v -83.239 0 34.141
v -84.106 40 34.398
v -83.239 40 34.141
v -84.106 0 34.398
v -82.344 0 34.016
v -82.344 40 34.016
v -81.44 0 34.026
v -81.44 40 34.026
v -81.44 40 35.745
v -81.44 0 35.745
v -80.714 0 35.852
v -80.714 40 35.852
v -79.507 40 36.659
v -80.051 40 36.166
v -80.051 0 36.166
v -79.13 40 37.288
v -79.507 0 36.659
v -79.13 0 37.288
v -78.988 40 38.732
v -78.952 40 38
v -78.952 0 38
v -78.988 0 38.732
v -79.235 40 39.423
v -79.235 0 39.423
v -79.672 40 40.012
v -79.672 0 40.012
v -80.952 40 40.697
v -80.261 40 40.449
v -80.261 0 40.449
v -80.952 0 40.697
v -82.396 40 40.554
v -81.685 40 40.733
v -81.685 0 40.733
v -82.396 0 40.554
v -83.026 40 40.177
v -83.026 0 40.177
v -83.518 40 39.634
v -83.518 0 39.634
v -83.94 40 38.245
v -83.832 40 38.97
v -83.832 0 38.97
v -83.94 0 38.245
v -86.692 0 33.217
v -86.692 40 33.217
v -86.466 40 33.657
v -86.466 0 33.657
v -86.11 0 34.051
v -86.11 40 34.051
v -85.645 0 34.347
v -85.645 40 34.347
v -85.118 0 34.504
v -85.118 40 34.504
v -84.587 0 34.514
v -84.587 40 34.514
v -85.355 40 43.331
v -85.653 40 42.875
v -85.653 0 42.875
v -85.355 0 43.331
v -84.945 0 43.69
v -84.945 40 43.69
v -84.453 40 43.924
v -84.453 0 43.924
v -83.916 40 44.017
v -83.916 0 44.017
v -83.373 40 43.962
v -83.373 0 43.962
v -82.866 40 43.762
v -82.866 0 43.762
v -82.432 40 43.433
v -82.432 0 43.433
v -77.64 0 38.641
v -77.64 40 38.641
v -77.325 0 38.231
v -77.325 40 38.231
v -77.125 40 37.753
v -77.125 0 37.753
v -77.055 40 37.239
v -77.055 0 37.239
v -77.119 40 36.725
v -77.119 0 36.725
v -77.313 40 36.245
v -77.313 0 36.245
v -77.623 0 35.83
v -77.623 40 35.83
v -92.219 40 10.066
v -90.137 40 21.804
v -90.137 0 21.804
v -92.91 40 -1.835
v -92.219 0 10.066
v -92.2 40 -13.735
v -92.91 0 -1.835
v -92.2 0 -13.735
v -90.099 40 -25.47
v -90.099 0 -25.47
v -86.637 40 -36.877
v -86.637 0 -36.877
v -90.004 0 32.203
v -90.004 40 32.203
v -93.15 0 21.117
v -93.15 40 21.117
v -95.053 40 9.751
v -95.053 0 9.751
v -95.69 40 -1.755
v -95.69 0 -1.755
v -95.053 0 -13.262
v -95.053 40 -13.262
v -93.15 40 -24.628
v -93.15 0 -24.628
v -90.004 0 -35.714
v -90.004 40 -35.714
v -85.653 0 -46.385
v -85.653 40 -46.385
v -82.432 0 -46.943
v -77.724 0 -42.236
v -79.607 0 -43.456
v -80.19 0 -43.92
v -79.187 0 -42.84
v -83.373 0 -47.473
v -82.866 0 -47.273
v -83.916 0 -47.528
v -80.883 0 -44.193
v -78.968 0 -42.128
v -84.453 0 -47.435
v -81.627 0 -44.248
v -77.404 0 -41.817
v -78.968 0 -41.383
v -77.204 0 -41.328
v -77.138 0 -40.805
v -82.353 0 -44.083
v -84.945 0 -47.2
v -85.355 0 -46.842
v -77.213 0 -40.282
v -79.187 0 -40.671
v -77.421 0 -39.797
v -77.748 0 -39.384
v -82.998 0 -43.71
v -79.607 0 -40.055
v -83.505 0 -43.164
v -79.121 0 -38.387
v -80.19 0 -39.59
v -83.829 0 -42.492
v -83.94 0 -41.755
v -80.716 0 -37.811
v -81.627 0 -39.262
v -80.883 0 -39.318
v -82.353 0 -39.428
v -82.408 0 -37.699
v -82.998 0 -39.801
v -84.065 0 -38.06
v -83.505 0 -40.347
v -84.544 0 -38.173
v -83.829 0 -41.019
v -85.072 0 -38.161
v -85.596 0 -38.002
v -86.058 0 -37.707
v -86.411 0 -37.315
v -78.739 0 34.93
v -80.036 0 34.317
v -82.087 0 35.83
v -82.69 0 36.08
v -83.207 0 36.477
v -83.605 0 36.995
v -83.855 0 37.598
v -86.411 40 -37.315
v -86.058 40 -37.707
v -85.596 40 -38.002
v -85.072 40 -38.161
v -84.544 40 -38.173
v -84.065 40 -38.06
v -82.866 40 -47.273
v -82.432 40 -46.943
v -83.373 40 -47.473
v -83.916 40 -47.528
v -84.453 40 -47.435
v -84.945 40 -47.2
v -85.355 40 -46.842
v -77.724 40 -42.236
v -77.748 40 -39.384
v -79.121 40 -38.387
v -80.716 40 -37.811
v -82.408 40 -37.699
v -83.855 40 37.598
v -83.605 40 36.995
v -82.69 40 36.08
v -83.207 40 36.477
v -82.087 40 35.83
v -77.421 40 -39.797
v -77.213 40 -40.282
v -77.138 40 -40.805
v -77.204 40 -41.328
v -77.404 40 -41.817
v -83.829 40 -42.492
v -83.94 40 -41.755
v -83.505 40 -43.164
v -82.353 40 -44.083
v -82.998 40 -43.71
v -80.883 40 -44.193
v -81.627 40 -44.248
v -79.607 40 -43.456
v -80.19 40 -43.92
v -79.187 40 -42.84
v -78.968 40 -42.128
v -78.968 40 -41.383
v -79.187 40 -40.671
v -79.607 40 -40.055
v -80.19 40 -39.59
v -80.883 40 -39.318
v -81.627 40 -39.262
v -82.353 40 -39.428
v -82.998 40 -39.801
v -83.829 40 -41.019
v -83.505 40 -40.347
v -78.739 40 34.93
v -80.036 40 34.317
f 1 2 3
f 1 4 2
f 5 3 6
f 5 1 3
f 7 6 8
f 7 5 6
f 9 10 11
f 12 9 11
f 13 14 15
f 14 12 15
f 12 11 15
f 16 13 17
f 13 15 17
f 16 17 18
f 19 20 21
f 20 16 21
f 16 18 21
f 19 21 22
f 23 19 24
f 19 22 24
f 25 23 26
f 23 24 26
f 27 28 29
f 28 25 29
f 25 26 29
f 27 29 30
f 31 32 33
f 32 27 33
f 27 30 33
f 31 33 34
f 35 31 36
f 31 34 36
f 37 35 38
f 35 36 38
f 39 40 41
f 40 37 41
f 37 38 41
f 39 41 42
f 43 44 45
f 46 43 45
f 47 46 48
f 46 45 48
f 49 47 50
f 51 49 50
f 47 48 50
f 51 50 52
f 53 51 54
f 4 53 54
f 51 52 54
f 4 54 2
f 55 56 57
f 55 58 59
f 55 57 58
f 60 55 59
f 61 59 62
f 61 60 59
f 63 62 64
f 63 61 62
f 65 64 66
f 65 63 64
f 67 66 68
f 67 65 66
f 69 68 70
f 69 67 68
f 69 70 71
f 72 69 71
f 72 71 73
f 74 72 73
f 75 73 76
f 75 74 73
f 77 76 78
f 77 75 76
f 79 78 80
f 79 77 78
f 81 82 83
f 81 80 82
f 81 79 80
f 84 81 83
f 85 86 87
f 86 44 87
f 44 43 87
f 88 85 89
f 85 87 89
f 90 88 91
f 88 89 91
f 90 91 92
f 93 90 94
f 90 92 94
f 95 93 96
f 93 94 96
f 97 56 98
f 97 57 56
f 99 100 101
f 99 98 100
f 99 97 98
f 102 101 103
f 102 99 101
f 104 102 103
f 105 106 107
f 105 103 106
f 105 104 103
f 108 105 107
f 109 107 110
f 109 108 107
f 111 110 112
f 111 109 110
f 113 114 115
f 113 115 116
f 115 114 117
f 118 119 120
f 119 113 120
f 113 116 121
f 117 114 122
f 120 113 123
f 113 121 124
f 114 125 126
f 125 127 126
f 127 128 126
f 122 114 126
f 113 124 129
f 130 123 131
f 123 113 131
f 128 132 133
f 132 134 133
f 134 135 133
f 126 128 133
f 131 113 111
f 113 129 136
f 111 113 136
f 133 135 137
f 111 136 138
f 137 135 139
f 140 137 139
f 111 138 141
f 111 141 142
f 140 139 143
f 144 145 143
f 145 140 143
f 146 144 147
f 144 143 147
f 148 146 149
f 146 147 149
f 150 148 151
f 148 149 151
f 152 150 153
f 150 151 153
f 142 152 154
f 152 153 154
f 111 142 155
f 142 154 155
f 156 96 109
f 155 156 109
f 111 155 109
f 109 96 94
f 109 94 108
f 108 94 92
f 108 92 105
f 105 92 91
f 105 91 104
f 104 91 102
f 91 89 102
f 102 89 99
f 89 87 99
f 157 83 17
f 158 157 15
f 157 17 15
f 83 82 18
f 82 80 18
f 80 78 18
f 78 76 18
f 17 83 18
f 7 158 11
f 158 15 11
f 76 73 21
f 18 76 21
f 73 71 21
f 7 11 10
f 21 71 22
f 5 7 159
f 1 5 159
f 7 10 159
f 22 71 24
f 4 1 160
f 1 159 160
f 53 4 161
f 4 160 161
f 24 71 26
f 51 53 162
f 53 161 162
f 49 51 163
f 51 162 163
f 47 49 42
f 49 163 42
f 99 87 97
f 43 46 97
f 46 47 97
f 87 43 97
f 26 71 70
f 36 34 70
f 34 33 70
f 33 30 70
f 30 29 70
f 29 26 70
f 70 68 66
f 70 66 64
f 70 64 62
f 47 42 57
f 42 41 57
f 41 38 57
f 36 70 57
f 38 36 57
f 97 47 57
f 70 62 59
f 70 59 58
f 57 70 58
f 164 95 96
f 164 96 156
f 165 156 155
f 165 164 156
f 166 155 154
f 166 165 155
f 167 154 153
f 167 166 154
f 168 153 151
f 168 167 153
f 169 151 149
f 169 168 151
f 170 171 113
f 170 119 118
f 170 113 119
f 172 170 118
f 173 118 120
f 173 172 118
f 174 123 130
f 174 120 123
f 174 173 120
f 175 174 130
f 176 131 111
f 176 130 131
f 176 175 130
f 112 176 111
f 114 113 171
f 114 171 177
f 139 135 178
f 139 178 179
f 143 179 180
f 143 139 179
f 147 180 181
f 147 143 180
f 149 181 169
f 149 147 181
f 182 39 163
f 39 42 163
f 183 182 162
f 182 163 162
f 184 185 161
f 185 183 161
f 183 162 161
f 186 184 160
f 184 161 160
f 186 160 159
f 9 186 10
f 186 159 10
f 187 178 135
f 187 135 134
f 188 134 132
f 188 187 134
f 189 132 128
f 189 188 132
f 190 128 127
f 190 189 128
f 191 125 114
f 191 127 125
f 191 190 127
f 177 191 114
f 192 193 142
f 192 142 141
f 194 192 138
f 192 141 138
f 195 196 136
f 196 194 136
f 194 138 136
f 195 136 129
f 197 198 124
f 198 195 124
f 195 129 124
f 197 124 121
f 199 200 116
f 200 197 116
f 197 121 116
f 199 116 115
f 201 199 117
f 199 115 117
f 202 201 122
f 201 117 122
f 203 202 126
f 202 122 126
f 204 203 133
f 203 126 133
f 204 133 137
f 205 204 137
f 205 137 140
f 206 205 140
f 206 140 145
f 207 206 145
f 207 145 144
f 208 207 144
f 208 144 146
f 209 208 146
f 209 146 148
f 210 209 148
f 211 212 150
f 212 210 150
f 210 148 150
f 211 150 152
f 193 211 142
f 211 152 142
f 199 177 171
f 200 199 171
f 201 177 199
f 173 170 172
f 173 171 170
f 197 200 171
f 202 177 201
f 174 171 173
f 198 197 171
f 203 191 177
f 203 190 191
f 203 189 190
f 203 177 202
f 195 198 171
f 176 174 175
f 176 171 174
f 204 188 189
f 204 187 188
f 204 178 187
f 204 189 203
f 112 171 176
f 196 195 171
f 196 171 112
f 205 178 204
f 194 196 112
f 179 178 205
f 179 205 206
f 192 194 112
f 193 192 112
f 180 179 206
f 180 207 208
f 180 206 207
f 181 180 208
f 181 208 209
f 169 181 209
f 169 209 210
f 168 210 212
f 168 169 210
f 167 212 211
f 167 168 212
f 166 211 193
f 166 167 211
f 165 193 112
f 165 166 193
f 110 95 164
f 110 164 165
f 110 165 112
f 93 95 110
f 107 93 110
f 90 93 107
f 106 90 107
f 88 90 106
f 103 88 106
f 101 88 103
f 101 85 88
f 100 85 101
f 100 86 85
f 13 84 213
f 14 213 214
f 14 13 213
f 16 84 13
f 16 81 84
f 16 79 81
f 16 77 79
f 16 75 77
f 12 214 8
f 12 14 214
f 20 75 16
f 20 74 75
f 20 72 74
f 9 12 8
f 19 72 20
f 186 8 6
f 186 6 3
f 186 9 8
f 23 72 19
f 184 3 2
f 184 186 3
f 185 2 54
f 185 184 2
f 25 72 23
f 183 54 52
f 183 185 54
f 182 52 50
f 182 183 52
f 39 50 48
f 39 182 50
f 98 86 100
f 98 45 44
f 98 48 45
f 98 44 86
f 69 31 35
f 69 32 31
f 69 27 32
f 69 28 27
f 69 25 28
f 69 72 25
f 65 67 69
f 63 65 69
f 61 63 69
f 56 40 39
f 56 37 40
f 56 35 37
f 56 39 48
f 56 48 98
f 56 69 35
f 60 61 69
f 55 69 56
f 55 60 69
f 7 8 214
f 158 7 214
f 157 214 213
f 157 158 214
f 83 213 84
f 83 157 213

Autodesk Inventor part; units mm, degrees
ref_plane "YZ Plane" through (0, 0, 0) normal (1, 0, 0) x (0, 1, 0)
ref_plane "XZ Plane" through (0, 0, 0) normal (0, 1, 0) x (-1, 0, 0)
ref_plane "XY Plane" through (0, 0, 0) normal (0, 0, 1) x (1, 0, 0)
sketch "Sketch1" plane through (0, 0, 0) normal (0, 1, 0) x (-1, 0, 0)
  line L0 (-57.8698, 32.3928) -> (-57.8698, 32.0292)
  line L1 (-57.8698, 32.0292) -> (-57.8698, 18.4092)
  line L2 (-57.8698, 18.4092) -> (-57.8698, 4.7892)
  line L3 (-57.8698, 4.7892) -> (-57.8698, -8.8308)
  line L4 (-57.8698, -8.8308) -> (-57.8698, -22.4508)
  line L5 (-57.8698, -1.839) -> (-57.8698, -36.0708)
  line L6 (-57.8698, -36.0708) -> (-54.7847, -36.7468)
  line L7 (-54.7847, -36.7468) -> (-50.239, -34.4141)
  line L8 (-50.239, -34.4141) -> (-38.1725, -14.554)
  line L9 (-38.1725, -14.554) -> (-34.8422, -12.8451)
  line L10 (-34.8422, -12.8451) -> (-8.0341, -30.0588)
  line L11 (-8.0341, -30.0588) -> (-8.0341, -78.5822)
  line L12 (-8.0341, -78.5822) -> (-8.0341, -99.6831)
  line L13 (-8.0341, -99.6831) -> (-7.0952, -101.449)
  line L14 (-7.0952, -101.449) -> (-2.0952, -101.449)
  line L15 (-1.1562, -99.6831) -> (-2.0952, -101.449)
  line L16 (-1.1562, -78.5822) -> (-1.1562, -99.6831)
  line L17 (-1.1562, -30.0588) -> (-1.1562, -78.5822)
  line L18 (-1.1562, -30.0588) -> (21.4276, -7.475)
  line L19 (21.4276, -7.475) -> (24.147, -4.7556)
  line L20 (24.147, -4.7556) -> (89.8399, -4.7556)
  line L21 (89.8399, -4.7556) -> (91.6058, -3.8166)
  line L22 (91.6058, 0.1386) -> (91.6058, -3.8166)
  line L23 (89.8399, 1.0776) -> (91.6058, 0.1386)
  line L24 (24.147, 1.0776) -> (89.8399, 1.0776)
  line L25 (21.4276, 3.797) -> (24.147, 1.0776)
  line L26 (-1.1562, 26.3808) -> (21.4276, 3.797)
  line L27 (-1.1562, 26.3808) -> (-1.1562, 74.9042)
  line L28 (-1.1562, 74.9042) -> (-1.1562, 96.0051)
  line L29 (-1.1562, 96.0051) -> (-2.0952, 97.771)
  line L30 (-7.0952, 97.771) -> (-2.0952, 97.771)
  line L31 (-8.0341, 96.0051) -> (-7.0952, 97.771)
  line L32 (-8.0341, 74.9042) -> (-8.0341, 96.0051)
  line L33 (-8.0341, 74.9042) -> (-8.0341, 96.0051)
  line L34 (-8.0341, 26.3808) -> (-8.0341, 74.9042)
  line L35 (-8.0341, 26.3808) -> (-8.0341, 74.9042)
  line L36 (-8.0341, 26.3808) -> (-8.0341, 74.9042)
  line L37 (-8.0341, 26.3808) -> (-8.0341, 74.9042)
  line L38 (-34.8422, 9.1671) -> (-8.0341, 26.3808)
  line L39 (-38.1725, 10.876) -> (-34.8422, 9.1671)
  line L40 (-50.239, 30.7361) -> (-38.1725, 10.876)
  line L41 (-54.7847, 33.0688) -> (-50.239, 30.7361)
  line L42 (-57.8698, 32.3928) -> (-54.7847, 33.0688)
  line L43 (-57.8698, -1.839) -> (-57.8698, -36.0708)
  line L44 (-57.8698, -1.839) -> (-57.8698, -36.0708)
  line L45 (-57.8698, -1.839) -> (-57.8698, -36.0708)
  line L46 (-57.8698, -36.0708) -> (-54.7847, -36.7468)
  line L47 (-54.7847, -36.7468) -> (-50.239, -34.4141)
  line L48 (-50.239, -34.4141) -> (-38.1725, -14.554)
  line L49 (-38.1725, -14.554) -> (-34.8422, -12.8451)
  line L50 (-34.8422, -12.8451) -> (-8.0341, -30.0588)
  line L51 (-8.0341, -30.0588) -> (-8.0341, -78.5822)
  line L52 (-8.0341, -78.5822) -> (-8.0341, -99.6831)
  line L53 (-8.0341, -99.6831) -> (-7.0952, -101.449)
  line L54 (-7.0952, -101.449) -> (-2.0952, -101.449)
  line L55 (-1.1562, -99.6831) -> (-2.0952, -101.449)
  line L56 (-1.1562, -78.5822) -> (-1.1562, -99.6831)
  line L57 (-1.1562, -30.0588) -> (-1.1562, -78.5822)
  line L58 (-1.1562, -30.0588) -> (21.4276, -7.475)
  line L59 (21.4276, -7.475) -> (24.147, -4.7556)
  line L60 (24.147, -4.7556) -> (89.8399, -4.7556)
  line L61 (89.8399, -4.7556) -> (91.6058, -3.8166)
  line L62 (91.6058, 0.1386) -> (91.6058, -3.8166)
  line L63 (89.8399, 1.0776) -> (91.6058, 0.1386)
  line L64 (24.147, 1.0776) -> (89.8399, 1.0776)
  line L65 (21.4276, 3.797) -> (24.147, 1.0776)
  line L66 (-1.1562, 26.3808) -> (21.4276, 3.797)
  line L67 (-1.1562, 26.3808) -> (-1.1562, 74.9042)
  line L68 (-1.1562, 74.9042) -> (-1.1562, 96.0051)
  line L69 (-1.1562, 96.0051) -> (-2.0952, 97.771)
  line L70 (-7.0952, 97.771) -> (-2.0952, 97.771)
  line L71 (-8.0341, 96.0051) -> (-7.0952, 97.771)
  line L72 (-8.0341, 74.9042) -> (-8.0341, 96.0051)
  line L73 (-8.0341, 69.2148) -> (-8.0341, 83.4928)
  line L74 (-8.0341, 54.9368) -> (-8.0341, 69.2148)
  line L75 (-8.0341, 40.6588) -> (-8.0341, 54.9368)
  line L76 (-8.0341, 26.3808) -> (-8.0341, 40.6588)
  line L77 (-34.8422, 9.1671) -> (-8.0341, 26.3808)
  line L78 (-38.1725, 10.876) -> (-34.8422, 9.1671)
  line L79 (-50.239, 30.7361) -> (-38.1725, 10.876)
  line L80 (-54.7847, 33.0688) -> (-50.239, 30.7361)
  line L81 (-57.8698, 32.3928) -> (-54.7847, 33.0688)
  line L82 (-57.8698, 32.3928) -> (-57.8698, 32.0292)
  line L83 (-57.8698, 32.0292) -> (-57.8698, 18.4092)
  line L84 (-57.8698, -1.839) -> (-57.8698, 26.3808)
  line L85 (-57.8698, -1.839) -> (-57.8698, 26.3808)
  line L86 (-8.0341, 26.3808) -> (-8.0341, 40.6588)
  line L87 (-34.8422, 9.1671) -> (-8.0341, 26.3808)
  line L88 (-38.1725, 10.876) -> (-34.8422, 9.1671)
  line L89 (-50.239, 30.7361) -> (-38.1725, 10.876)
  line L90 (-54.7847, 33.0688) -> (-50.239, 30.7361)
  line L91 (-57.8698, 32.3928) -> (-54.7847, 33.0688)
  line L92 (-57.8698, 32.3928) -> (-57.8698, 32.0292)
  line L93 (-57.8698, 32.0292) -> (-57.8698, 18.4092)
  line L94 (-57.8698, -1.839) -> (-57.8698, 26.3808)
  line L95 (-57.8698, -1.839) -> (-57.8698, 26.3808)
  line L96 (-57.8698, -1.839) -> (-57.8698, -36.0708)
  line L97 (-57.8698, -1.839) -> (-57.8698, -36.0708)
  line L98 (-57.8698, -1.839) -> (-57.8698, -36.0708)
  line L99 (-57.8698, -36.0708) -> (-54.7847, -36.7468)
  line L100 (-54.7847, -36.7468) -> (-50.239, -34.4141)
  line L101 (-50.239, -34.4141) -> (-38.1725, -14.554)
  line L102 (-38.1725, -14.554) -> (-34.8422, -12.8451)
  line L103 (-34.8422, -12.8451) -> (-8.0341, -30.0588)
  line L104 (-8.0341, -30.0588) -> (-8.0341, -78.5822)
  line L105 (-8.0341, -78.5822) -> (-8.0341, -99.6831)
  line L106 (-8.0341, -99.6831) -> (-7.0952, -101.449)
  line L107 (-7.0952, -101.449) -> (-2.0952, -101.449)
  line L108 (-1.1562, -99.6831) -> (-2.0952, -101.449)
  line L109 (-1.1562, -78.5822) -> (-1.1562, -99.6831)
  line L110 (-1.1562, -30.0588) -> (-1.1562, -78.5822)
  line L111 (-1.1562, -30.0588) -> (21.4276, -7.475)
  line L112 (21.4276, -7.475) -> (24.147, -4.7556)
  line L113 (24.147, -4.7556) -> (89.8399, -4.7556)
  line L114 (89.8399, -4.7556) -> (91.6058, -3.8166)
  line L115 (91.6058, 0.1386) -> (91.6058, -3.8166)
  line L116 (89.8399, 1.0776) -> (91.6058, 0.1386)
  line L117 (24.147, 1.0776) -> (89.8399, 1.0776)
  line L118 (21.4276, 3.797) -> (24.147, 1.0776)
  line L119 (-1.1562, 26.3808) -> (21.4276, 3.797)
  line L120 (-1.1562, 26.3808) -> (-1.1562, 74.9042)
  line L121 (-1.1562, 74.9042) -> (-1.1562, 96.0051)
  line L122 (-1.1562, 96.0051) -> (-2.0952, 97.771)
  line L123 (-7.0952, 97.771) -> (-2.0952, 97.771)
  line L124 (-8.0341, 96.0051) -> (-7.0952, 97.771)
  line L125 (-8.0341, 74.9042) -> (-8.0341, 96.0051)
  line L126 (-8.0341, 69.2148) -> (-8.0341, 83.4928)
  line L127 (-8.0341, 54.9368) -> (-8.0341, 69.2148)
  line L128 (-8.0341, 26.3808) -> (-8.0341, 74.9042)
  line L129 (-57.8698, -1.839) -> (-57.8698, 26.3808)
  line L130 (-57.8698, -1.839) -> (-57.8698, 26.3808)
  line L131 (-57.8698, -1.839) -> (-57.8698, 26.3808)
  line L132 (-57.8698, -1.839) -> (-57.8698, -36.0708)
  line L133 (-57.8698, -1.839) -> (-57.8698, -36.0708)
  line L134 (-57.8698, -1.839) -> (-57.8698, -36.0708)
  line L135 (-57.8698, -36.0708) -> (-54.7847, -36.7468)
  line L136 (-54.7847, -36.7468) -> (-50.239, -34.4141)
  line L137 (-50.239, -34.4141) -> (-38.1725, -14.554)
  line L138 (-38.1725, -14.554) -> (-34.8422, -12.8451)
  line L139 (-34.8422, -12.8451) -> (-8.0341, -30.0588)
  line L140 (-8.0341, -30.0588) -> (-8.0341, -78.5822)
  line L141 (-8.0341, -78.5822) -> (-8.0341, -99.6831)
  line L142 (-8.0341, -99.6831) -> (-7.0952, -101.449)
  line L143 (-7.0952, -101.449) -> (-2.0952, -101.449)
  line L144 (-1.1562, -99.6831) -> (-2.0952, -101.449)
  line L145 (-1.1562, -78.5822) -> (-1.1562, -99.6831)
  line L146 (-1.1562, -30.0588) -> (-1.1562, -78.5822)
  line L147 (-1.1562, -30.0588) -> (21.4276, -7.475)
  line L148 (21.4276, -7.475) -> (24.147, -4.7556)
  line L149 (24.147, -4.7556) -> (89.8399, -4.7556)
  line L150 (89.8399, -4.7556) -> (91.6058, -3.8166)
  line L151 (91.6058, 0.1386) -> (91.6058, -3.8166)
  line L152 (89.8399, 1.0776) -> (91.6058, 0.1386)
  line L153 (24.147, 1.0776) -> (89.8399, 1.0776)
  line L154 (21.4276, 3.797) -> (24.147, 1.0776)
  line L155 (-1.1562, 26.3808) -> (21.4276, 3.797)
  line L156 (-1.1562, 26.3808) -> (-1.1562, 74.9042)
  line L157 (-1.1562, 74.9042) -> (-1.1562, 96.0051)
  line L158 (-1.1562, 96.0051) -> (-2.0952, 97.771)
  line L159 (-7.0952, 97.771) -> (-2.0952, 97.771)
  line L160 (-8.0341, 96.0051) -> (-7.0952, 97.771)
  line L161 (-8.0341, 74.9042) -> (-8.0341, 96.0051)
  line L162 (-8.0341, 69.2148) -> (-8.0341, 83.4928)
  line L163 (-8.0341, 54.9368) -> (-8.0341, 69.2148)
  line L164 (-8.0341, 40.6588) -> (-8.0341, 54.9368)
  line L165 (-8.0341, 26.3808) -> (-8.0341, 40.6588)
  line L166 (-34.8422, 9.1671) -> (-8.0341, 26.3808)
  line L167 (-38.1725, 10.876) -> (-34.8422, 9.1671)
  line L168 (-50.239, 30.7361) -> (-38.1725, 10.876)
  line L169 (-54.7847, 33.0688) -> (-50.239, 30.7361)
  line L170 (-57.8698, 32.3928) -> (-54.7847, 33.0688)
  line L171 (-57.8698, 32.3928) -> (-57.8698, 32.0292)
  line L172 (-57.8698, 26.3808) -> (-57.8698, 32.0292)
  line L173 (-57.8698, 32.0292) -> (-57.8698, 32.3928)
  line L174 (-57.8698, 32.3928) -> (-54.7847, 33.0688)
  line L175 (-54.7847, 33.0688) -> (-50.239, 30.7361)
  line L176 (-50.239, 30.7361) -> (-38.1725, 10.876)
  line L177 (-38.1725, 10.876) -> (-34.8422, 9.1671)
  line L178 (-34.8422, 9.1671) -> (-8.0341, 26.3808)
  line L179 (-8.0341, 26.3808) -> (-8.0341, 74.9042)
  line L180 (-8.0341, 74.9042) -> (-8.0341, 96.0051)
  line L181 (-8.0341, 96.0051) -> (-7.0952, 97.771)
  line L182 (-7.0952, 97.771) -> (-2.0952, 97.771)
  line L183 (-2.0952, 97.771) -> (-1.1562, 96.0051)
  line L184 (-1.1562, 96.0051) -> (-1.1562, 74.9042)
  line L185 (-1.1562, 74.9042) -> (-1.1562, 26.3808)
  line L186 (-1.1562, 26.3808) -> (21.4276, 3.797)
  line L187 (21.4276, 3.797) -> (24.147, 1.0776)
  line L188 (24.147, 1.0776) -> (89.8399, 1.0776)
  line L189 (89.8399, 1.0776) -> (91.6058, 0.1386)
  line L190 (91.6058, 0.1386) -> (91.6058, -3.8166)
  line L191 (91.6058, -3.8166) -> (89.8399, -4.7556)
  line L192 (89.8399, -4.7556) -> (24.147, -4.7556)
  line L193 (24.147, -4.7556) -> (21.4276, -7.475)
  line L194 (21.4276, -7.475) -> (-1.1562, -30.0588)
  line L195 (-57.8698, 32.0292) -> (-57.8698, 26.3808)
  line L196 (-57.8698, 26.3808) -> (-57.8698, -1.839)
  line L197 (-57.8698, -1.839) -> (-57.8698, -36.0708)
  line L198 (-57.8698, -36.0708) -> (-54.7847, -36.7468)
  line L199 (-54.7847, -36.7468) -> (-50.239, -34.4141)
  line L200 (-50.239, -34.4141) -> (-38.1725, -14.554)
  line L201 (-38.1725, -14.554) -> (-34.8422, -12.8451)
  line L202 (-34.8422, -12.8451) -> (-8.0341, -30.0588)
  line L203 (-8.0341, -30.0588) -> (-8.0341, -78.5822)
  line L204 (-8.0341, -78.5822) -> (-8.0341, -99.6831)
  line L205 (-8.0341, -99.6831) -> (-7.0952, -101.449)
  line L206 (-7.0952, -101.449) -> (-2.0952, -101.449)
  line L207 (-2.0952, -101.449) -> (-1.1562, -99.6831)
  line L208 (-1.1562, -99.6831) -> (-1.1562, -78.5822)
  line L209 (-1.1562, -78.5822) -> (-1.1562, -30.0588)
  line L210 (77.614, -1.839) -> (78.114, -1.839)
  line L211 (78.114, -1.839) -> (78.614, -1.839)
  line L212 (64.1222, -1.839) -> (64.6222, -1.839)
  line L213 (64.6222, -1.839) -> (65.1222, -1.839)
  line L214 (51.6304, -1.839) -> (51.1304, -1.839)
  line L215 (51.1304, -1.839) -> (50.6304, -1.839)
  line L216 (38.1386, -1.839) -> (37.6386, -1.839)
  line L217 (37.6386, -1.839) -> (37.1386, -1.839)
  line L218 (-57.8698, -22.4508) -> (-55.8698, -22.4508)
  line L219 (-55.8698, -22.4508) -> (-55.8698, -22.9508)
  line L220 (-55.8698, -22.4508) -> (-55.8698, -21.9508)
  line L221 (-57.8698, -8.8308) -> (-55.8698, -8.8308)
  line L222 (-55.8698, -8.8308) -> (-55.8698, -9.3308)
  line L223 (-55.8698, -8.8308) -> (-55.8698, -8.3308)
  line L224 (-57.8698, 4.7892) -> (-55.8698, 4.7892)
  line L225 (-55.8698, 4.7892) -> (-55.8698, 4.2892)
  line L226 (-55.8698, 4.7892) -> (-55.8698, 5.2892)
  line L227 (-55.8698, 18.4092) -> (-55.8698, 18.9092)
  line L228 (-55.8698, 18.4092) -> (-55.8698, 17.9092)
  line L229 (-57.8698, 18.4092) -> (-55.8698, 18.4092)
  line L230 (-6.0341, -87.1708) -> (-6.0341, -87.6708)
  line L231 (-6.0341, -44.3368) -> (-6.0341, -43.8368)
  line L232 (-8.0341, -87.1708) -> (-6.0341, -87.1708)
  line L233 (-6.0341, -87.1708) -> (-6.0341, -86.6708)
  line L234 (-6.0341, -72.8928) -> (-6.0341, -73.3928)
  line L235 (-8.0341, -72.8928) -> (-6.0341, -72.8928)
  line L236 (-8.0341, -58.6148) -> (-6.0341, -58.6148)
  line L237 (-6.0341, -44.3368) -> (-6.0341, -44.8368)
  line L238 (-8.0341, -44.3368) -> (-6.0341, -44.3368)
  line L239 (-6.0341, -58.6148) -> (-6.0341, -58.1148)
  line L240 (-6.0341, -58.6148) -> (-6.0341, -59.1148)
  line L241 (-6.0341, -72.8928) -> (-6.0341, -72.3928)
  line L242 (-8.0341, 83.4928) -> (-6.0341, 83.4928)
  line L243 (-6.0341, 83.4928) -> (-6.0341, 82.9928)
  line L244 (-6.0341, 83.4928) -> (-6.0341, 83.9928)
  line L245 (-8.0341, 69.2148) -> (-6.0341, 69.2148)
  line L246 (-6.0341, 69.2148) -> (-6.0341, 68.7148)
  line L247 (-6.0341, 69.2148) -> (-6.0341, 69.7148)
  line L248 (-8.0341, 54.9368) -> (-6.0341, 54.9368)
  line L249 (-6.0341, 54.9368) -> (-6.0341, 54.4368)
  line L250 (-6.0341, 54.9368) -> (-6.0341, 55.4368)
  line L251 (-6.0341, 40.6588) -> (-6.0341, 41.1588)
  line L252 (-6.0341, 40.6588) -> (-6.0341, 40.1588)
  line L253 (-8.0341, 40.6588) -> (-6.0341, 40.6588)
  arc A0 (-93.5154, -61.1235) -> (-93.5154, 57.6128) centre (-175.9423, -1.7554) ccw
  arc A1 (85.0786, -49.2607) -> (85.0786, 45.75) centre (-8.5603, -1.7554) ccw
  arc A2 (-30.2114, -104.4989) -> (38.945, -95.3943) centre (-8.5603, -1.7554) ccw
  line L254 (78.614, -1.839) -> (78.614, -0.439)
  line L255 (78.614, -0.439) -> (83.614, -0.439)
  line L256 (83.614, -0.439) -> (83.614, -3.239)
  line L257 (83.614, -3.239) -> (78.614, -3.239)
  line L258 (78.614, -3.239) -> (78.614, -1.839)
  line L259 (78.114, -1.839) -> (78.114, -1.2219)
  line L260 (77.614, -1.839) -> (77.614, -0.439)
  line L261 (72.614, -3.239) -> (77.614, -3.239)
  line L262 (77.614, -0.439) -> (72.614, -0.439)
  line L263 (72.614, -0.439) -> (72.614, -3.239)
  line L264 (77.614, -3.239) -> (77.614, -1.839)
  line L265 (64.1222, -1.839) -> (64.1222, -0.439)
  line L266 (64.1222, -3.239) -> (64.1222, -1.839)
  line L267 (64.1222, -0.439) -> (59.9222, -0.439)
  line L268 (59.9222, -3.239) -> (64.1222, -3.239)
  line L269 (59.9222, -0.439) -> (59.9222, -3.239)
  line L270 (70.1222, -0.439) -> (70.1222, -3.239)
  line L271 (65.1222, -0.439) -> (70.1222, -0.439)
  line L272 (70.1222, -3.239) -> (65.1222, -3.239)
  line L273 (65.1222, -1.839) -> (65.1222, -0.439)
  line L274 (65.1222, -3.239) -> (65.1222, -1.839)
  line L275 (50.6304, -1.839) -> (50.6304, -0.439)
  line L276 (50.6304, -3.239) -> (50.6304, -1.839)
  line L277 (50.6304, -0.439) -> (46.4304, -0.439)
  line L278 (46.4304, -3.239) -> (50.6304, -3.239)
  line L279 (46.4304, -0.439) -> (46.4304, -3.239)
  line L280 (56.6304, -0.439) -> (56.6304, -3.239)
  line L281 (51.6304, -0.439) -> (56.6304, -0.439)
  line L282 (56.6304, -3.239) -> (51.6304, -3.239)
  line L283 (51.6304, -1.839) -> (51.6304, -0.439)
  line L284 (51.6304, -3.239) -> (51.6304, -1.839)
  line L285 (37.1386, -1.839) -> (37.1386, -0.439)
  line L286 (37.1386, -3.239) -> (37.1386, -1.839)
  line L287 (37.1386, -0.439) -> (32.9386, -0.439)
  line L288 (32.9386, -3.239) -> (37.1386, -3.239)
  line L289 (32.9386, -0.439) -> (32.9386, -3.239)
  line L290 (43.1386, -0.439) -> (43.1386, -3.239)
  line L291 (38.1386, -0.439) -> (43.1386, -0.439)
  line L292 (43.1386, -3.239) -> (38.1386, -3.239)
  line L293 (38.1386, -1.839) -> (38.1386, -0.439)
  line L294 (38.1386, -3.239) -> (38.1386, -1.839)
  line L295 (-6.0341, -59.1148) -> (-3.8341, -59.1148)
  line L296 (-6.0341, -59.1148) -> (-6.0341, -61.4148)
  line L297 (-6.0341, -61.4148) -> (-6.0341, -63.5148)
  line L298 (-3.8341, -67.9148) -> (-3.8341, -59.1148)
  line L299 (-6.0341, -61.4148) -> (-6.0341, -67.9148)
  line L300 (-6.0341, -67.9148) -> (-3.8341, -67.9148)
  line L301 (-6.0341, -43.8368) -> (-5.3341, -43.8368)
  line L302 (-5.3341, -43.8368) -> (-2.7341, -43.8368)
  line L303 (-6.0341, -43.8368) -> (-6.0341, -40.4368)
  line L304 (-6.0341, -40.4368) -> (-2.7341, -40.4368)
  line L305 (-2.7341, -40.4368) -> (-2.7341, -43.8368)
  line L306 (-6.0341, -58.1148) -> (-6.0341, -54.7148)
  line L307 (-6.0341, -58.1148) -> (-5.3341, -58.1148)
  line L308 (-6.0341, -54.7148) -> (-2.7341, -54.7148)
  line L309 (-2.7341, -54.7148) -> (-2.7341, -58.1148)
  line L310 (-5.3341, -58.1148) -> (-2.7341, -58.1148)
  line L311 (-6.0341, -72.3928) -> (-6.0341, -68.9928)
  line L312 (-6.0341, -72.3928) -> (-5.3341, -72.3928)
  line L313 (-6.0341, -68.9928) -> (-2.7341, -68.9928)
  line L314 (-2.7341, -68.9928) -> (-2.7341, -72.3928)
  line L315 (-5.3341, -72.3928) -> (-2.7341, -72.3928)
  line L316 (-6.0341, -86.6708) -> (-6.0341, -83.2708)
  line L317 (-6.0341, -86.6708) -> (-5.3341, -86.6708)
  line L318 (-6.0341, -83.2708) -> (-2.7341, -83.2708)
  line L319 (-2.7341, -83.2708) -> (-2.7341, -86.6708)
  line L320 (-5.3341, -86.6708) -> (-2.7341, -86.6708)
  line L321 (-55.8698, -22.9508) -> (-55.8698, -25.1508)
  line L322 (-55.8698, -25.1508) -> (-53.7698, -25.1508)
  line L323 (-53.7698, -25.1508) -> (-47.1198, -25.1508)
  line L324 (-47.1198, -25.1508) -> (-47.1198, -22.9508)
  line L325 (-47.1198, -22.9508) -> (-55.8698, -22.9508)
  line L326 (-55.8698, -21.9508) -> (-54.8198, -21.9508)
  line L327 (-54.8198, -21.9508) -> (-48.6198, -21.9508)
  line L328 (-55.8698, -21.9508) -> (-55.8698, -20.6508)
  line L329 (-55.8698, -20.6508) -> (-48.6198, -20.6508)
  line L330 (-48.6198, -20.6508) -> (-48.6198, -21.9508)
  line L331 (-6.0341, 40.1588) -> (-6.0341, 36.7588)
  line L332 (-6.0341, 36.7588) -> (-2.9341, 36.7588)
  line L333 (-2.9341, 36.7588) -> (-2.9341, 40.1588)
  line L334 (-2.9341, 40.1588) -> (-6.0341, 40.1588)
  line L335 (-6.0341, -82.1928) -> (-3.8341, -82.1928)
  line L336 (-6.0341, -75.6928) -> (-6.0341, -77.7928)
  line L337 (-6.0341, -75.6928) -> (-6.0341, -82.1928)
  line L338 (-3.8341, -82.1928) -> (-3.8341, -73.3928)
  line L339 (-6.0341, -73.3928) -> (-3.8341, -73.3928)
  line L340 (-6.0341, -73.3928) -> (-6.0341, -75.6928)
  line L341 (-6.0341, -96.4708) -> (-3.8341, -96.4708)
  line L342 (-6.0341, -89.9708) -> (-6.0341, -92.0708)
  line L343 (-6.0341, -89.9708) -> (-6.0341, -96.4708)
  line L344 (-3.8341, -96.4708) -> (-3.8341, -87.6708)
  line L345 (-6.0341, -87.6708) -> (-3.8341, -87.6708)
  line L346 (-6.0341, -87.6708) -> (-6.0341, -89.9708)
  line L347 (-6.0341, -53.6368) -> (-3.8341, -53.6368)
  line L348 (-6.0341, -47.1368) -> (-6.0341, -49.2368)
  line L349 (-6.0341, -47.1368) -> (-6.0341, -53.6368)
  line L350 (-3.8341, -53.6368) -> (-3.8341, -44.8368)
  line L351 (-6.0341, -44.8368) -> (-3.8341, -44.8368)
  line L352 (-6.0341, -44.8368) -> (-6.0341, -47.1368)
  line L353 (-55.8698, -9.3308) -> (-55.8698, -11.5308)
  line L354 (-47.1198, -9.3308) -> (-55.8698, -9.3308)
  line L355 (-47.1198, -11.5308) -> (-47.1198, -9.3308)
  line L356 (-53.7698, -11.5308) -> (-47.1198, -11.5308)
  line L357 (-55.8698, -11.5308) -> (-53.7698, -11.5308)
  line L358 (-54.8198, -8.3308) -> (-48.6198, -8.3308)
  line L359 (-48.6198, -7.0308) -> (-48.6198, -8.3308)
  line L360 (-55.8698, -7.0308) -> (-48.6198, -7.0308)
  line L361 (-55.8698, -8.3308) -> (-55.8698, -7.0308)
  line L362 (-55.8698, -8.3308) -> (-54.8198, -8.3308)
  line L363 (-55.8698, 4.2892) -> (-55.8698, 2.0892)
  line L364 (-47.1198, 4.2892) -> (-55.8698, 4.2892)
  line L365 (-47.1198, 2.0892) -> (-47.1198, 4.2892)
  line L366 (-53.7698, 2.0892) -> (-47.1198, 2.0892)
  line L367 (-55.8698, 2.0892) -> (-53.7698, 2.0892)
  line L368 (-54.8198, 5.2892) -> (-48.6198, 5.2892)
  line L369 (-48.6198, 6.5892) -> (-48.6198, 5.2892)
  line L370 (-55.8698, 6.5892) -> (-48.6198, 6.5892)
  line L371 (-55.8698, 5.2892) -> (-55.8698, 6.5892)
  line L372 (-55.8698, 5.2892) -> (-54.8198, 5.2892)
  line L373 (-55.8698, 17.9092) -> (-55.8698, 15.7092)
  line L374 (-47.1198, 17.9092) -> (-55.8698, 17.9092)
  line L375 (-47.1198, 15.7092) -> (-47.1198, 17.9092)
  line L376 (-53.7698, 15.7092) -> (-47.1198, 15.7092)
  line L377 (-55.8698, 15.7092) -> (-53.7698, 15.7092)
  line L378 (-54.8198, 18.9092) -> (-48.6198, 18.9092)
  line L379 (-48.6198, 20.2092) -> (-48.6198, 18.9092)
  line L380 (-55.8698, 20.2092) -> (-48.6198, 20.2092)
  line L381 (-55.8698, 18.9092) -> (-55.8698, 20.2092)
  line L382 (-55.8698, 18.9092) -> (-54.8198, 18.9092)
  line L383 (-6.0341, 41.1588) -> (-6.0341, 49.8588)
  line L384 (-6.0341, 49.8588) -> (-3.8341, 49.8588)
  line L385 (-3.8341, 49.8588) -> (-3.8341, 41.1588)
  line L386 (-3.8341, 41.1588) -> (-6.0341, 41.1588)
  line L387 (-2.9341, 51.0368) -> (-2.9341, 54.4368)
  line L388 (-6.0341, 54.4368) -> (-6.0341, 51.0368)
  line L389 (-2.9341, 54.4368) -> (-6.0341, 54.4368)
  line L390 (-6.0341, 51.0368) -> (-2.9341, 51.0368)
  line L391 (-3.8341, 55.4368) -> (-6.0341, 55.4368)
  line L392 (-6.0341, 64.1368) -> (-3.8341, 64.1368)
  line L393 (-6.0341, 55.4368) -> (-6.0341, 64.1368)
  line L394 (-3.8341, 64.1368) -> (-3.8341, 55.4368)
  line L395 (-2.9341, 65.3148) -> (-2.9341, 68.7148)
  line L396 (-6.0341, 68.7148) -> (-6.0341, 65.3148)
  line L397 (-2.9341, 68.7148) -> (-6.0341, 68.7148)
  line L398 (-6.0341, 65.3148) -> (-2.9341, 65.3148)
  line L399 (-3.8341, 69.7148) -> (-6.0341, 69.7148)
  line L400 (-6.0341, 78.4148) -> (-3.8341, 78.4148)
  line L401 (-6.0341, 69.7148) -> (-6.0341, 78.4148)
  line L402 (-3.8341, 78.4148) -> (-3.8341, 69.7148)
  line L403 (-2.9341, 79.5928) -> (-2.9341, 82.9928)
  line L404 (-6.0341, 82.9928) -> (-6.0341, 79.5928)
  line L405 (-2.9341, 82.9928) -> (-6.0341, 82.9928)
  line L406 (-6.0341, 79.5928) -> (-2.9341, 79.5928)
  line L407 (-3.8341, 83.9928) -> (-6.0341, 83.9928)
  line L408 (-6.0341, 92.6928) -> (-3.8341, 92.6928)
  line L409 (-6.0341, 83.9928) -> (-6.0341, 92.6928)
  line L410 (-3.8341, 92.6928) -> (-3.8341, 83.9928)
  line L411 (83.614, -1.839) -> (92.364, -1.839)
  line L412 (83.614, -1.839) -> (92.364, -1.839) construction
  arc A3 (81.8808, -49.77) -> (85.0786, -49.2607) centre (83.295, -48.3558) ccw
  line L413 (81.8808, -49.77) -> (71.0762, -38.9655)
  arc A4 (85.0786, -49.2607) -> (85.0786, 45.75) centre (-8.5603, -1.7554) ccw
  line L414 (81.8808, 46.2593) -> (71.0762, 35.4548)
  arc A5 (85.0786, 45.75) -> (81.8808, 46.2593) centre (83.295, 44.8451) ccw
  arc A6 (85.8036, -39.0594) -> (85.8533, 35.4227) centre (-8.5603, -1.7554) ccw
  line L415 (81.4397, -1.7554) -> (81.4397, 38.2446)
  circle A7 centre (81.4397, 38.2446) radius 2.5
  circle A8 centre (81.4397, -41.7554) radius 2.5
  arc A9 (84.4097, -48.9214) -> (84.4097, 45.4107) centre (-8.5603, -1.7554) ccw
  line L416 (84.4097, -48.9214) -> (76.533, -41.0447)
  line L417 (84.4097, 45.4107) -> (76.4785, 37.4794)
  arc A10 (76.4785, 37.4794) -> (85.8533, 35.4227) centre (81.9578, 40.0608) ccw
  arc A11 (85.8533, -39.1007) -> (76.4785, -41.1574) centre (81.9578, -43.7388) ccw
  point P0 (0, 0)
  point P1 (0, 0)
  dimension "d0" = 2.3
  dimension "d1" = 2.1
  dimension "d2" = 6.5
  dimension "d3" = 2.2
  dimension "d4" = 0.7
  dimension "d5" = 2.6
  dimension "d6" = 3.4
  dimension "d7" = 0.7
  dimension "d8" = 2.6
  dimension "d9" = 3.4
  dimension "d10" = 2.6
  dimension "d11" = 3.4
  dimension "d12" = 0.7
  dimension "d13" = 2.6
  dimension "d14" = 3.4
  dimension "d15" = 2.2
  dimension "d16" = 1.3
  dimension "d17" = 3.4
  dimension "d18" = 3.1
  dimension "d19" = 5
  dimension "d20" = 5
  dimension "d21" = 5
  dimension "d22" = 5
  dimension "d23" = 8.8
  dimension "d24" = 2.3
  dimension "d25" = 2.1
  dimension "d26" = 6.5
  dimension "d27" = 2.2
  dimension "d28" = 8.8
  dimension "d29" = 2.3
  dimension "d30" = 2.1
  dimension "d31" = 6.5
  dimension "d32" = 2.2
  dimension "d33" = 8.8
  dimension "d34" = 2.3
  dimension "d35" = 2.1
  dimension "d36" = 6.5
  dimension "d37" = 2.2
  dimension "d38" = 8.8
  dimension "d39" = 8.75
  dimension "d40" = 7.25
  dimension "d41" = 2.2
  dimension "d42" = 1.3
  dimension "d43" = 8.75
  dimension "d44" = 7.25
  dimension "d45" = 2.2
  dimension "d46" = 1.3
  dimension "d47" = 8.75
  dimension "d48" = 7.25
  dimension "d49" = 2.2
  dimension "d50" = 1.3
  dimension "d51" = 8.75
  dimension "d52" = 7.25
  dimension "d53" = 8.7
  dimension "d54" = 2.2
  dimension "d55" = 3.4
  dimension "d56" = 3.1
  dimension "d57" = 8.7
  dimension "d58" = 2.2
  dimension "d59" = 3.4
  dimension "d60" = 3.1
  dimension "d61" = 8.7
  dimension "d62" = 2.2
  dimension "d63" = 3.4
extrude "Extrusion1" add sketch "Sketch1" along normal blind 40 contours A6 A10 L417 A9 L416 A11
fillet "Fillet1" radius 2 6 edges at (-84.4097, 20, -48.9214) (-76.533, 20, -41.0447) (-84.4097, 20, 45.4107) (-85.8533, 20, 35.4227) (-76.4785, 20, 37.4794) (-85.8036, 20, -39.0594)
properties part number "back plate"
